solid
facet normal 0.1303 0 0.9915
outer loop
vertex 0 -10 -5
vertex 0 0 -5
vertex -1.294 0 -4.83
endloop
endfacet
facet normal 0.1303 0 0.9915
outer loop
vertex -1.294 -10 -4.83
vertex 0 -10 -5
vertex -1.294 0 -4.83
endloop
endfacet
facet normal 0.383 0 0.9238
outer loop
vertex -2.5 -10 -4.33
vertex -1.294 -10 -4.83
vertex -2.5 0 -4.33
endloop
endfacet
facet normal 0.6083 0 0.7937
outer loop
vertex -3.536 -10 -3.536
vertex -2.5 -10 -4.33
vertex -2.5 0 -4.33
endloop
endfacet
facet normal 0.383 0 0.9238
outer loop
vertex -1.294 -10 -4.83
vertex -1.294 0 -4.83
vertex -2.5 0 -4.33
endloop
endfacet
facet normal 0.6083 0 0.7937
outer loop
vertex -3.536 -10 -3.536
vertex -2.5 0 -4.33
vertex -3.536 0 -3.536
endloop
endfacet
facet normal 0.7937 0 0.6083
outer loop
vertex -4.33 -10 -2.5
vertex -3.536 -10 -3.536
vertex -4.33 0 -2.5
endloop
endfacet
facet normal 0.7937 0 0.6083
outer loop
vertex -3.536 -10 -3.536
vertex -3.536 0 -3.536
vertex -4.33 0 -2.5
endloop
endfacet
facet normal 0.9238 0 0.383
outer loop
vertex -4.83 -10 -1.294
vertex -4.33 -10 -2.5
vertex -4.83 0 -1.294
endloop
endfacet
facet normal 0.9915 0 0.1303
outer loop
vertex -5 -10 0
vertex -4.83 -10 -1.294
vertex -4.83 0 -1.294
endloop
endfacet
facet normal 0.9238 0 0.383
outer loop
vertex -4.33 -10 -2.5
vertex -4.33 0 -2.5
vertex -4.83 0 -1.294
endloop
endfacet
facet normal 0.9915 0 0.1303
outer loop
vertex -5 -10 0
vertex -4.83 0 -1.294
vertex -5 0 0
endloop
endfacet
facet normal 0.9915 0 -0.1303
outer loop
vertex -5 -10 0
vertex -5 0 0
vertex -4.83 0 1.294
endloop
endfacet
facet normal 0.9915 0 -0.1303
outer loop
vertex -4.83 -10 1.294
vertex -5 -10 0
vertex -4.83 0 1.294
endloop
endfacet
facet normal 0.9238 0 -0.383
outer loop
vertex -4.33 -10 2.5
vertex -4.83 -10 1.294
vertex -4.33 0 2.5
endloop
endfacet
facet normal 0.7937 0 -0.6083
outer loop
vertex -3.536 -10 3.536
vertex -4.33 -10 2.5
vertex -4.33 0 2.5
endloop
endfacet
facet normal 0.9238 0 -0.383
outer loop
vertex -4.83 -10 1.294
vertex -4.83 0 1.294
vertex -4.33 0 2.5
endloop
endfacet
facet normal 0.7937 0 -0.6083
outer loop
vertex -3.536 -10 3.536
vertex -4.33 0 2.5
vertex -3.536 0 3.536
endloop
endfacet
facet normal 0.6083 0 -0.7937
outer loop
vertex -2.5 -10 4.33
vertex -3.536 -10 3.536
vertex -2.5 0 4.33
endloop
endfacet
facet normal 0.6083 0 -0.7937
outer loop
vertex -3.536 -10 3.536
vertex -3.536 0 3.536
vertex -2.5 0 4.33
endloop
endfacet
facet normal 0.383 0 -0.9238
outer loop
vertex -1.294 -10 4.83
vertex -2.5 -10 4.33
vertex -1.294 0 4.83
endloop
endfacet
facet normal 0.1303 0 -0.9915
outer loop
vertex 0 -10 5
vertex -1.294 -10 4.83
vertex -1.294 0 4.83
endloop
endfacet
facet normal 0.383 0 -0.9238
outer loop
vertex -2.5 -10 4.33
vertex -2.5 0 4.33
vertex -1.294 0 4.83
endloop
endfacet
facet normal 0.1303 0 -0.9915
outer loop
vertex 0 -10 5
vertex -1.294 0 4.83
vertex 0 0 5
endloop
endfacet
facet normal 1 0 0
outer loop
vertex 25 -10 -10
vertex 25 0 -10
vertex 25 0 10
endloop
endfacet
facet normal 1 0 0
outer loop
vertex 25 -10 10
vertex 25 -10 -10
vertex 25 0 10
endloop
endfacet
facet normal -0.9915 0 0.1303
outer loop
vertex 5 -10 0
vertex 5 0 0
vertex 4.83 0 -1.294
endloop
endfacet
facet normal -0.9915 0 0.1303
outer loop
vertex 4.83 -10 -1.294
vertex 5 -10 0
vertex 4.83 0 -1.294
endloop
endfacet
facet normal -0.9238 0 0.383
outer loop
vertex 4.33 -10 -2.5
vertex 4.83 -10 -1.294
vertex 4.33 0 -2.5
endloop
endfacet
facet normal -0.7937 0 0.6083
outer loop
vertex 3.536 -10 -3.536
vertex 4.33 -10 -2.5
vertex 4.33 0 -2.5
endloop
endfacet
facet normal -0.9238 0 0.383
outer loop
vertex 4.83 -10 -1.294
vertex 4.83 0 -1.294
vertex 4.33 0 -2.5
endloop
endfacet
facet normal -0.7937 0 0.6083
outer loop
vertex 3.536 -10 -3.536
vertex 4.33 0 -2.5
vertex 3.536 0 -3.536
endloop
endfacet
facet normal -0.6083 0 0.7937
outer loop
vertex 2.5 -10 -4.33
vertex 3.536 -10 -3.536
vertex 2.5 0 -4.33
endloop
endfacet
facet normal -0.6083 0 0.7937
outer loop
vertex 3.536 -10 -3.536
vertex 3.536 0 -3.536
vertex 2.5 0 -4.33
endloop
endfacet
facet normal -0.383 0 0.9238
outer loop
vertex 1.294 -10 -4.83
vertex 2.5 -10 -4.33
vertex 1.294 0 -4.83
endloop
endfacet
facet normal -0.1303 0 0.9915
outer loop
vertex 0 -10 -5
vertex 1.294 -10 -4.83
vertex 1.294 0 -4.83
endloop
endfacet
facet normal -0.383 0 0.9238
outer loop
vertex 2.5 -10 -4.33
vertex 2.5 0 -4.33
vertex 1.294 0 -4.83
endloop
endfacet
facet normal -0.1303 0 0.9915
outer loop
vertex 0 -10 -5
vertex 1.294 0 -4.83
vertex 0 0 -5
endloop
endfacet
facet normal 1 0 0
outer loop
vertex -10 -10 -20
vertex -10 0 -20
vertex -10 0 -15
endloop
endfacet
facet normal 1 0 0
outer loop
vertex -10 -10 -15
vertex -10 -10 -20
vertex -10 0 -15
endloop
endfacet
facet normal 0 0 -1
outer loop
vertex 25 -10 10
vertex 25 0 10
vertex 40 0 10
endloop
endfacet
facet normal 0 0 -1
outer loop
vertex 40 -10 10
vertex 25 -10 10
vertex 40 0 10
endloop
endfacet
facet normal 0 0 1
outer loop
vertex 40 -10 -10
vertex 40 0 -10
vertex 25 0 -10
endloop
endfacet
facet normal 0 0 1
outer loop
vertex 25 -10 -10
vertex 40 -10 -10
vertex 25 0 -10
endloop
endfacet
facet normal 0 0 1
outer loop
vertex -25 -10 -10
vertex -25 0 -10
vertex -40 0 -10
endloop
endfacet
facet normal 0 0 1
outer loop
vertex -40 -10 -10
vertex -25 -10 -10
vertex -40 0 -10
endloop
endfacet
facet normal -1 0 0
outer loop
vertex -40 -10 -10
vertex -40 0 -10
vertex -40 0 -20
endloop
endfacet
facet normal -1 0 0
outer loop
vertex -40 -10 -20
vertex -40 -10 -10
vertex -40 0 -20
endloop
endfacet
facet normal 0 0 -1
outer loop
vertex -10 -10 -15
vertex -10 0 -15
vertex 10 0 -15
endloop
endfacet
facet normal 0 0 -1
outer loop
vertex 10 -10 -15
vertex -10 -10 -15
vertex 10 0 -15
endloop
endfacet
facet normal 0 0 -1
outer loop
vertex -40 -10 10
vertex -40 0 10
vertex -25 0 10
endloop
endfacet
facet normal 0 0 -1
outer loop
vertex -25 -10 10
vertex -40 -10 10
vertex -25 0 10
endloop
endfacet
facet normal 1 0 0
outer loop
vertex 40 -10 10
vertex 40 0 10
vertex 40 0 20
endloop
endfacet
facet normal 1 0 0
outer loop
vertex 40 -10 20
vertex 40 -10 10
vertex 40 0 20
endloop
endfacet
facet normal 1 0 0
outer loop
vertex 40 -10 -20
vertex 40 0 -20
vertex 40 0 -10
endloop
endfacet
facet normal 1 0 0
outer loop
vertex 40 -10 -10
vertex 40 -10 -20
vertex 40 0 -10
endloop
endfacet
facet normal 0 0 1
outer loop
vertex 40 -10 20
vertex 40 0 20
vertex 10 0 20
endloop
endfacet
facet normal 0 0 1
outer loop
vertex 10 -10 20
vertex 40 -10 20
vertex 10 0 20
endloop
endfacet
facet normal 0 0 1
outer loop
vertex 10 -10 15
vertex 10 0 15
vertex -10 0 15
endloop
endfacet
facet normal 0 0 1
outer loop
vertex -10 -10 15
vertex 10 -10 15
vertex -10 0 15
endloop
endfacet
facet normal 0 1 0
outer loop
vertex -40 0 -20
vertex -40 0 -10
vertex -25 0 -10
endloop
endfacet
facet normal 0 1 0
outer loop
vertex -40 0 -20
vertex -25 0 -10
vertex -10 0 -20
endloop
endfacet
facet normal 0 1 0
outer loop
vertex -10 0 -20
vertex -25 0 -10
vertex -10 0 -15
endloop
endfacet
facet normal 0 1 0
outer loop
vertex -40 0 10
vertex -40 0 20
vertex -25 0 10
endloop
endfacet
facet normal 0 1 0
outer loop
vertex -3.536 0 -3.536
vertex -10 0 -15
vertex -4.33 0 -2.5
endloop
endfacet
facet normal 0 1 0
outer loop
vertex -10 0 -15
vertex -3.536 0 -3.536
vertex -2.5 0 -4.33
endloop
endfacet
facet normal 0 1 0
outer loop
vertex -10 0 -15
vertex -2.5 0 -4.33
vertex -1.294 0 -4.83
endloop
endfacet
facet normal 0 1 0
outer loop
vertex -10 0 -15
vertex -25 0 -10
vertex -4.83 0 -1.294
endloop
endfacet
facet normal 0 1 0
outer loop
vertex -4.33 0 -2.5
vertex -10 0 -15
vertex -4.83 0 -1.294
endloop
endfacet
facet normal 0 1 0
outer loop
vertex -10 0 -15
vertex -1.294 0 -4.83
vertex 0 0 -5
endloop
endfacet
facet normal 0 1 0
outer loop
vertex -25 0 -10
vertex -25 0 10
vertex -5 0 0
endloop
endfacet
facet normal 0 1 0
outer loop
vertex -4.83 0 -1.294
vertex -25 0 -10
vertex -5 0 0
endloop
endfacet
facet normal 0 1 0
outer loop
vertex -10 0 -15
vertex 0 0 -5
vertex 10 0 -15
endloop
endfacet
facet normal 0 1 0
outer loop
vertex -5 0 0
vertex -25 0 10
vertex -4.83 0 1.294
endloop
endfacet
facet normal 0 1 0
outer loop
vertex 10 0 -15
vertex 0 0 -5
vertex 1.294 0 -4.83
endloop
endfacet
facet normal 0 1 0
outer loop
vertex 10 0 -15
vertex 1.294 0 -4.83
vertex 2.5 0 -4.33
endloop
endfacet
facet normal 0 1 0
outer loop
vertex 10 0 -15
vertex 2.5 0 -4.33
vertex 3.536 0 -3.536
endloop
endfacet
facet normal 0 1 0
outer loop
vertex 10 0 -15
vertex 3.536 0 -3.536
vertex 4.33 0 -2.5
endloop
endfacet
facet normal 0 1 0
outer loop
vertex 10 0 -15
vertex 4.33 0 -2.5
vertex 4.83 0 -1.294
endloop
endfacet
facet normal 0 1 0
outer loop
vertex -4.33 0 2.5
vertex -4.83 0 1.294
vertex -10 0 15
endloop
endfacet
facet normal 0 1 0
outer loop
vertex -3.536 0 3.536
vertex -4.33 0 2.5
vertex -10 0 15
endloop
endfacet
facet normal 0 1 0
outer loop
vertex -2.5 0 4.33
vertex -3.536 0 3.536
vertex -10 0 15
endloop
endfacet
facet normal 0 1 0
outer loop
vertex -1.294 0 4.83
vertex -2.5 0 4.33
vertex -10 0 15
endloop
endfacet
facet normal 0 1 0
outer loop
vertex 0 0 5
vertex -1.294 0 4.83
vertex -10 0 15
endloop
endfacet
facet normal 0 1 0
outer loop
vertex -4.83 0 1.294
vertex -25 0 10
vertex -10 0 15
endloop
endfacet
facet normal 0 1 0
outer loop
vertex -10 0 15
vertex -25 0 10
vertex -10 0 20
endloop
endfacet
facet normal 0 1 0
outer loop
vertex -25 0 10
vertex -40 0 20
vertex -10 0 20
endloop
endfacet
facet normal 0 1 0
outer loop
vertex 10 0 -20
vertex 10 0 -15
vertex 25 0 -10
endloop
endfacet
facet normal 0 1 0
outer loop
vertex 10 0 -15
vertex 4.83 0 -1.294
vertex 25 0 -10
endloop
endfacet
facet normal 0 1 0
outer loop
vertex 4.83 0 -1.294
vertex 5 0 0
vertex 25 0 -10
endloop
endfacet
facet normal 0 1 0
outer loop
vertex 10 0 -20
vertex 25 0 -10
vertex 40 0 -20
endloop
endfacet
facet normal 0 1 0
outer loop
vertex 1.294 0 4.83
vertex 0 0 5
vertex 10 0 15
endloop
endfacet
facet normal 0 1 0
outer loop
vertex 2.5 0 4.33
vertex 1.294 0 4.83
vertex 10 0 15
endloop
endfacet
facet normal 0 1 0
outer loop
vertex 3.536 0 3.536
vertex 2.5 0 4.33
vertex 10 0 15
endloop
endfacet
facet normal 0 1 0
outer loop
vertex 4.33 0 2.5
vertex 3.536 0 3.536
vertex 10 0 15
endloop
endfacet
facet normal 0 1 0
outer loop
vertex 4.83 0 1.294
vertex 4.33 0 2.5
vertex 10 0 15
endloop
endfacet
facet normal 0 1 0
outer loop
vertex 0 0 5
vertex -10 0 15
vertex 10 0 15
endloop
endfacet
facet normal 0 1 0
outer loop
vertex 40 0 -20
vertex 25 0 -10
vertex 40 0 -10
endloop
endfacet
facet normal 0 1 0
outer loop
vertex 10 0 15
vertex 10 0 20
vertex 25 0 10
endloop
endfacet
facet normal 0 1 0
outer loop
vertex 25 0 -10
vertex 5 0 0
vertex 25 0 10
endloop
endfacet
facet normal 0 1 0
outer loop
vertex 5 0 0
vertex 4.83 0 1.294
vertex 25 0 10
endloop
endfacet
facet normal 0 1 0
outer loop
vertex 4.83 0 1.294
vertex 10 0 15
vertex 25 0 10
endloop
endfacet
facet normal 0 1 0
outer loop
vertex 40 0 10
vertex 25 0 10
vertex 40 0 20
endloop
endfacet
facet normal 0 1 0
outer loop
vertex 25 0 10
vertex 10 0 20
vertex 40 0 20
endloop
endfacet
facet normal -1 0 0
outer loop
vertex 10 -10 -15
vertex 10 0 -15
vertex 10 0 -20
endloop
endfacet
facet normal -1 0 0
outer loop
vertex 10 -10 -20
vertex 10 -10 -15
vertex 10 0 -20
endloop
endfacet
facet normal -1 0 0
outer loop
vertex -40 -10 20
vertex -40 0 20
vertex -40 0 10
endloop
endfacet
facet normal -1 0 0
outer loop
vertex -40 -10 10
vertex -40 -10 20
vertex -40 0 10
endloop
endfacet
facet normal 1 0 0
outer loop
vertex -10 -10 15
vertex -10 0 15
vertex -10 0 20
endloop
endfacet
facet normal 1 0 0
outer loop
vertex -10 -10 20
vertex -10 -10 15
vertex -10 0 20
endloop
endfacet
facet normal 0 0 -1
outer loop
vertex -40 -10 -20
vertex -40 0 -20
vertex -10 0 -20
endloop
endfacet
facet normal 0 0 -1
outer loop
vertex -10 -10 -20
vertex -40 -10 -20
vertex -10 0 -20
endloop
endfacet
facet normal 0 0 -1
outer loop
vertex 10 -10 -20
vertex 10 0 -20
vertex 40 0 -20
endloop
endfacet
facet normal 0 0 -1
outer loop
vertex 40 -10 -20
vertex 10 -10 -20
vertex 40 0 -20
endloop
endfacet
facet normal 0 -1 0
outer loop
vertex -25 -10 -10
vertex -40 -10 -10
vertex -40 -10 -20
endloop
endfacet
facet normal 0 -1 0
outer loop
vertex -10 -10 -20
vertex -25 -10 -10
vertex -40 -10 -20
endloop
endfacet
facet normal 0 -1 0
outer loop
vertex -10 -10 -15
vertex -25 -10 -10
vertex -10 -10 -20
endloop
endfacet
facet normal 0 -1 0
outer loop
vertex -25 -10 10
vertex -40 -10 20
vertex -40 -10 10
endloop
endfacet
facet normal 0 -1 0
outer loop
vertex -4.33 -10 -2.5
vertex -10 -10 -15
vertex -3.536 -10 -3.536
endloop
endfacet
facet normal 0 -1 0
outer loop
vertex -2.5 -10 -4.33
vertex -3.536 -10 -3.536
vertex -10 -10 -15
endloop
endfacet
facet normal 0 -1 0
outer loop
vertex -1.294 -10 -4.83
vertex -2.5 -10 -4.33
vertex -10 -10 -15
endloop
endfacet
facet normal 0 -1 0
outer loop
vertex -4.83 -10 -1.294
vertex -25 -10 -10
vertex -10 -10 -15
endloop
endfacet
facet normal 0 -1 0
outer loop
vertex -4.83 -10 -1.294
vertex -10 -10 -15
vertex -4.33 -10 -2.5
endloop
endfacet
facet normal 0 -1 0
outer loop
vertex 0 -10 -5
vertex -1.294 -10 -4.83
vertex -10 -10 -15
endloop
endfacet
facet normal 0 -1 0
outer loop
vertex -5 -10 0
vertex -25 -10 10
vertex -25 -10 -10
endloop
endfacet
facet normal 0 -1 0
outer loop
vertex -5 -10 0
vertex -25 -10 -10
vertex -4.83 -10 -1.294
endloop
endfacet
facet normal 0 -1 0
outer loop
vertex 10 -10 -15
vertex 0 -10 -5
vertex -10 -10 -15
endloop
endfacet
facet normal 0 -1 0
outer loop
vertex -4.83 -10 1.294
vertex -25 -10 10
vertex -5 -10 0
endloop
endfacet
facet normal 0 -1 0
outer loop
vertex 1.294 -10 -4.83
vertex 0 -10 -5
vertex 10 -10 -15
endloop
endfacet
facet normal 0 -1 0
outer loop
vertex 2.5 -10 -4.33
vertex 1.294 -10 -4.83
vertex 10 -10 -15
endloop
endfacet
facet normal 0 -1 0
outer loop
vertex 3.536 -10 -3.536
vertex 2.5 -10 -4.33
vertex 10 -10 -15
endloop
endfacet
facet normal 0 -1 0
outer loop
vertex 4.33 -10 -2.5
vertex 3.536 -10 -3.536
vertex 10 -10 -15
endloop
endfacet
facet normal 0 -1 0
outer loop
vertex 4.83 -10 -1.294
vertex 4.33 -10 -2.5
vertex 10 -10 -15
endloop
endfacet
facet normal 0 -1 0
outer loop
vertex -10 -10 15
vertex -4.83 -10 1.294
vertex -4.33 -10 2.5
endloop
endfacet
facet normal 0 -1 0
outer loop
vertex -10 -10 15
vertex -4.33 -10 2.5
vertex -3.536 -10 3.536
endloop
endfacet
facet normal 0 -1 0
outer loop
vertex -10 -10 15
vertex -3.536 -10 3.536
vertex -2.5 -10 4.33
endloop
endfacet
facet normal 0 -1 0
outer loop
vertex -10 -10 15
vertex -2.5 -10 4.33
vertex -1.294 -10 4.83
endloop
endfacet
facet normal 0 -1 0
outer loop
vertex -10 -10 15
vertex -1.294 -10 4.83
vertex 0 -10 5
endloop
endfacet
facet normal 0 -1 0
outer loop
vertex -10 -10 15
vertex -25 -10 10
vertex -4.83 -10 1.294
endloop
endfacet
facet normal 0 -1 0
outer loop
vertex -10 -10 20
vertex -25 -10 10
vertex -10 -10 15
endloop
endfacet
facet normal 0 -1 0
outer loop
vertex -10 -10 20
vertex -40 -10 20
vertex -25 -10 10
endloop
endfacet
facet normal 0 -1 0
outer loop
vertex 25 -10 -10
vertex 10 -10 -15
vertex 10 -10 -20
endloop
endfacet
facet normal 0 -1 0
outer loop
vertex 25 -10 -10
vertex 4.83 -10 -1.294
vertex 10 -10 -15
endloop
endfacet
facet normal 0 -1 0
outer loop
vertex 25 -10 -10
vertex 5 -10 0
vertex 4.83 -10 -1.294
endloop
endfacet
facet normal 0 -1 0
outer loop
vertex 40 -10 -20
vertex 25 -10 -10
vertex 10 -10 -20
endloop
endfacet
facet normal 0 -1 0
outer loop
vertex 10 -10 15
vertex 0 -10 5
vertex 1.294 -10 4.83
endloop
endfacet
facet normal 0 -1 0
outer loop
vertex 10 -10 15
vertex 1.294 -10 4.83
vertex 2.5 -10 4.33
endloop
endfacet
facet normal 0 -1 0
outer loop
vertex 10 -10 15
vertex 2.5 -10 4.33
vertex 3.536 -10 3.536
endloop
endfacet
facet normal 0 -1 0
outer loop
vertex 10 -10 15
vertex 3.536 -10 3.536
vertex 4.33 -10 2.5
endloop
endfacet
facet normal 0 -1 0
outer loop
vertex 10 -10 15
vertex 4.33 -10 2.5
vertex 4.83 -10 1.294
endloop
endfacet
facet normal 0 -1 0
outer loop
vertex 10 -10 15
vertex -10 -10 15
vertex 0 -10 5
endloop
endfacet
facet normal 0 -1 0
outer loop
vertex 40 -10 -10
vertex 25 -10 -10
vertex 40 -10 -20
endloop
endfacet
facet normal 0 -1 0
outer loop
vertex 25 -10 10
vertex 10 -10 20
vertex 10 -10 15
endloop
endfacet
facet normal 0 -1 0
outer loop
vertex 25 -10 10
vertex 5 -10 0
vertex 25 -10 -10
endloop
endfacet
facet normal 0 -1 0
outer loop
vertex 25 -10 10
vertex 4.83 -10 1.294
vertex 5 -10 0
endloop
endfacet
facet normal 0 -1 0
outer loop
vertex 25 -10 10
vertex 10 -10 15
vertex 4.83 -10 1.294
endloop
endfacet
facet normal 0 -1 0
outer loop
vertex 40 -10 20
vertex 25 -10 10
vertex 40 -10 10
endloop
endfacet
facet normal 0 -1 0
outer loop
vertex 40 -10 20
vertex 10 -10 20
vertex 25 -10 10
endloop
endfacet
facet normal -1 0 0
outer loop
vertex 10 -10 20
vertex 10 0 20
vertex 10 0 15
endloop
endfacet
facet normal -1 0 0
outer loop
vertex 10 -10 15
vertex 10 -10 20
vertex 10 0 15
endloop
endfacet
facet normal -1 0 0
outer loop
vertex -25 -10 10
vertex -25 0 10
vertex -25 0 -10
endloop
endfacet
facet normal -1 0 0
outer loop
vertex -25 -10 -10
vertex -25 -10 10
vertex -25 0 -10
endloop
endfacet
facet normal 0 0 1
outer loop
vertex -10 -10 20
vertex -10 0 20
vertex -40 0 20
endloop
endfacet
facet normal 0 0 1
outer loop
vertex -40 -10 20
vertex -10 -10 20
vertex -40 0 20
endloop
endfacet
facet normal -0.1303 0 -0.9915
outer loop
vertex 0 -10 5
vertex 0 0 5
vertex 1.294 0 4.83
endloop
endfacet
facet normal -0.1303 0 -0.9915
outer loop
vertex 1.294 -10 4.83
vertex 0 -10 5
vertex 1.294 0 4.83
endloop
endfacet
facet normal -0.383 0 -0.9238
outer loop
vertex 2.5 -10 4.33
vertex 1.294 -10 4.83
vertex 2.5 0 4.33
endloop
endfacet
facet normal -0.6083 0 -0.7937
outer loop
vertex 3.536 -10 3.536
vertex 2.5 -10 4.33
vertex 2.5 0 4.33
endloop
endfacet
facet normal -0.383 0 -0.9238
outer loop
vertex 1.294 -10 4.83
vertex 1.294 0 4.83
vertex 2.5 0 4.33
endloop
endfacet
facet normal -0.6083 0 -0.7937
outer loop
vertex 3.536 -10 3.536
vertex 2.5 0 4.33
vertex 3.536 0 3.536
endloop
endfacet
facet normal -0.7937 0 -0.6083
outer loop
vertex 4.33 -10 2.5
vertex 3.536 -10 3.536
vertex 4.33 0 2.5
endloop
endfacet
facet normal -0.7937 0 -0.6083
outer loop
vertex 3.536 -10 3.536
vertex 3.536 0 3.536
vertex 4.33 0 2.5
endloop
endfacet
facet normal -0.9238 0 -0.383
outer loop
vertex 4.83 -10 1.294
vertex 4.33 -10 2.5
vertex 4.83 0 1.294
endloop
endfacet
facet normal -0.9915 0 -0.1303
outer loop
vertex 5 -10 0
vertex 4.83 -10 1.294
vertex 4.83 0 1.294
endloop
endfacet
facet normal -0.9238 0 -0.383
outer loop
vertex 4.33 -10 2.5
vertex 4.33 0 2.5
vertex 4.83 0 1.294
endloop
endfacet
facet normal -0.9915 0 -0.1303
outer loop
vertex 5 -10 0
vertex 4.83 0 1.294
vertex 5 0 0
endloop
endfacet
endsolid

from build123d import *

# Parameters (mm, degrees)
F1_DEPTH = 10


with BuildPart() as f1:
    # F0 (on Front) → F1 (new body)
    with BuildSketch(Plane.XZ):
        with BuildLine():
            ThreePointArc((0, 5), (3.535534, 3.535534), (5, 0))
            Line((5, 0), (25, 0))
            Line((25, 0), (25, 10))
            Line((25, 10), (40, 10))
            Line((40, 10), (40, 20))
            Line((40, 20), (10, 20))
            Line((10, 20), (10, 15))
            Line((10, 15), (0, 15))
            Line((0, 15), (0, 5))
        make_face()
        with BuildLine():
            Line((25, 0), (5, 0))
            ThreePointArc((5, 0), (3.535534, -3.535534), (0, -5))
            Line((0, -5), (0, -15))
            Line((0, -15), (10, -15))
            Line((10, -15), (10, -20))
            Line((10, -20), (40, -20))
            Line((40, -20), (40, -10))
            Line((40, -10), (25, -10))
            Line((25, -10), (25, 0))
        make_face()
        with BuildLine():
            ThreePointArc((-5, 0), (-3.535534, 3.535534), (0, 5))
            Line((0, 5), (0, 15))
            Line((0, 15), (-10, 15))
            Line((-10, 15), (-10, 20))
            Line((-10, 20), (-40, 20))
            Line((-40, 20), (-40, 10))
            Line((-40, 10), (-25, 10))
            Line((-25, 10), (-25, 0))
            Line((-25, 0), (-25, -10))
            Line((-25, -10), (-40, -10))
            Line((-40, -10), (-40, -20))
            Line((-40, -20), (-10, -20))
            Line((-10, -20), (-10, -15))
            Line((-10, -15), (0, -15))
            Line((0, -15), (0, -5))
            ThreePointArc((0, -5), (-3.535534, -3.535534), (-5, 0))
        make_face()
    extrude(amount=F1_DEPTH)


solid = f1.part
